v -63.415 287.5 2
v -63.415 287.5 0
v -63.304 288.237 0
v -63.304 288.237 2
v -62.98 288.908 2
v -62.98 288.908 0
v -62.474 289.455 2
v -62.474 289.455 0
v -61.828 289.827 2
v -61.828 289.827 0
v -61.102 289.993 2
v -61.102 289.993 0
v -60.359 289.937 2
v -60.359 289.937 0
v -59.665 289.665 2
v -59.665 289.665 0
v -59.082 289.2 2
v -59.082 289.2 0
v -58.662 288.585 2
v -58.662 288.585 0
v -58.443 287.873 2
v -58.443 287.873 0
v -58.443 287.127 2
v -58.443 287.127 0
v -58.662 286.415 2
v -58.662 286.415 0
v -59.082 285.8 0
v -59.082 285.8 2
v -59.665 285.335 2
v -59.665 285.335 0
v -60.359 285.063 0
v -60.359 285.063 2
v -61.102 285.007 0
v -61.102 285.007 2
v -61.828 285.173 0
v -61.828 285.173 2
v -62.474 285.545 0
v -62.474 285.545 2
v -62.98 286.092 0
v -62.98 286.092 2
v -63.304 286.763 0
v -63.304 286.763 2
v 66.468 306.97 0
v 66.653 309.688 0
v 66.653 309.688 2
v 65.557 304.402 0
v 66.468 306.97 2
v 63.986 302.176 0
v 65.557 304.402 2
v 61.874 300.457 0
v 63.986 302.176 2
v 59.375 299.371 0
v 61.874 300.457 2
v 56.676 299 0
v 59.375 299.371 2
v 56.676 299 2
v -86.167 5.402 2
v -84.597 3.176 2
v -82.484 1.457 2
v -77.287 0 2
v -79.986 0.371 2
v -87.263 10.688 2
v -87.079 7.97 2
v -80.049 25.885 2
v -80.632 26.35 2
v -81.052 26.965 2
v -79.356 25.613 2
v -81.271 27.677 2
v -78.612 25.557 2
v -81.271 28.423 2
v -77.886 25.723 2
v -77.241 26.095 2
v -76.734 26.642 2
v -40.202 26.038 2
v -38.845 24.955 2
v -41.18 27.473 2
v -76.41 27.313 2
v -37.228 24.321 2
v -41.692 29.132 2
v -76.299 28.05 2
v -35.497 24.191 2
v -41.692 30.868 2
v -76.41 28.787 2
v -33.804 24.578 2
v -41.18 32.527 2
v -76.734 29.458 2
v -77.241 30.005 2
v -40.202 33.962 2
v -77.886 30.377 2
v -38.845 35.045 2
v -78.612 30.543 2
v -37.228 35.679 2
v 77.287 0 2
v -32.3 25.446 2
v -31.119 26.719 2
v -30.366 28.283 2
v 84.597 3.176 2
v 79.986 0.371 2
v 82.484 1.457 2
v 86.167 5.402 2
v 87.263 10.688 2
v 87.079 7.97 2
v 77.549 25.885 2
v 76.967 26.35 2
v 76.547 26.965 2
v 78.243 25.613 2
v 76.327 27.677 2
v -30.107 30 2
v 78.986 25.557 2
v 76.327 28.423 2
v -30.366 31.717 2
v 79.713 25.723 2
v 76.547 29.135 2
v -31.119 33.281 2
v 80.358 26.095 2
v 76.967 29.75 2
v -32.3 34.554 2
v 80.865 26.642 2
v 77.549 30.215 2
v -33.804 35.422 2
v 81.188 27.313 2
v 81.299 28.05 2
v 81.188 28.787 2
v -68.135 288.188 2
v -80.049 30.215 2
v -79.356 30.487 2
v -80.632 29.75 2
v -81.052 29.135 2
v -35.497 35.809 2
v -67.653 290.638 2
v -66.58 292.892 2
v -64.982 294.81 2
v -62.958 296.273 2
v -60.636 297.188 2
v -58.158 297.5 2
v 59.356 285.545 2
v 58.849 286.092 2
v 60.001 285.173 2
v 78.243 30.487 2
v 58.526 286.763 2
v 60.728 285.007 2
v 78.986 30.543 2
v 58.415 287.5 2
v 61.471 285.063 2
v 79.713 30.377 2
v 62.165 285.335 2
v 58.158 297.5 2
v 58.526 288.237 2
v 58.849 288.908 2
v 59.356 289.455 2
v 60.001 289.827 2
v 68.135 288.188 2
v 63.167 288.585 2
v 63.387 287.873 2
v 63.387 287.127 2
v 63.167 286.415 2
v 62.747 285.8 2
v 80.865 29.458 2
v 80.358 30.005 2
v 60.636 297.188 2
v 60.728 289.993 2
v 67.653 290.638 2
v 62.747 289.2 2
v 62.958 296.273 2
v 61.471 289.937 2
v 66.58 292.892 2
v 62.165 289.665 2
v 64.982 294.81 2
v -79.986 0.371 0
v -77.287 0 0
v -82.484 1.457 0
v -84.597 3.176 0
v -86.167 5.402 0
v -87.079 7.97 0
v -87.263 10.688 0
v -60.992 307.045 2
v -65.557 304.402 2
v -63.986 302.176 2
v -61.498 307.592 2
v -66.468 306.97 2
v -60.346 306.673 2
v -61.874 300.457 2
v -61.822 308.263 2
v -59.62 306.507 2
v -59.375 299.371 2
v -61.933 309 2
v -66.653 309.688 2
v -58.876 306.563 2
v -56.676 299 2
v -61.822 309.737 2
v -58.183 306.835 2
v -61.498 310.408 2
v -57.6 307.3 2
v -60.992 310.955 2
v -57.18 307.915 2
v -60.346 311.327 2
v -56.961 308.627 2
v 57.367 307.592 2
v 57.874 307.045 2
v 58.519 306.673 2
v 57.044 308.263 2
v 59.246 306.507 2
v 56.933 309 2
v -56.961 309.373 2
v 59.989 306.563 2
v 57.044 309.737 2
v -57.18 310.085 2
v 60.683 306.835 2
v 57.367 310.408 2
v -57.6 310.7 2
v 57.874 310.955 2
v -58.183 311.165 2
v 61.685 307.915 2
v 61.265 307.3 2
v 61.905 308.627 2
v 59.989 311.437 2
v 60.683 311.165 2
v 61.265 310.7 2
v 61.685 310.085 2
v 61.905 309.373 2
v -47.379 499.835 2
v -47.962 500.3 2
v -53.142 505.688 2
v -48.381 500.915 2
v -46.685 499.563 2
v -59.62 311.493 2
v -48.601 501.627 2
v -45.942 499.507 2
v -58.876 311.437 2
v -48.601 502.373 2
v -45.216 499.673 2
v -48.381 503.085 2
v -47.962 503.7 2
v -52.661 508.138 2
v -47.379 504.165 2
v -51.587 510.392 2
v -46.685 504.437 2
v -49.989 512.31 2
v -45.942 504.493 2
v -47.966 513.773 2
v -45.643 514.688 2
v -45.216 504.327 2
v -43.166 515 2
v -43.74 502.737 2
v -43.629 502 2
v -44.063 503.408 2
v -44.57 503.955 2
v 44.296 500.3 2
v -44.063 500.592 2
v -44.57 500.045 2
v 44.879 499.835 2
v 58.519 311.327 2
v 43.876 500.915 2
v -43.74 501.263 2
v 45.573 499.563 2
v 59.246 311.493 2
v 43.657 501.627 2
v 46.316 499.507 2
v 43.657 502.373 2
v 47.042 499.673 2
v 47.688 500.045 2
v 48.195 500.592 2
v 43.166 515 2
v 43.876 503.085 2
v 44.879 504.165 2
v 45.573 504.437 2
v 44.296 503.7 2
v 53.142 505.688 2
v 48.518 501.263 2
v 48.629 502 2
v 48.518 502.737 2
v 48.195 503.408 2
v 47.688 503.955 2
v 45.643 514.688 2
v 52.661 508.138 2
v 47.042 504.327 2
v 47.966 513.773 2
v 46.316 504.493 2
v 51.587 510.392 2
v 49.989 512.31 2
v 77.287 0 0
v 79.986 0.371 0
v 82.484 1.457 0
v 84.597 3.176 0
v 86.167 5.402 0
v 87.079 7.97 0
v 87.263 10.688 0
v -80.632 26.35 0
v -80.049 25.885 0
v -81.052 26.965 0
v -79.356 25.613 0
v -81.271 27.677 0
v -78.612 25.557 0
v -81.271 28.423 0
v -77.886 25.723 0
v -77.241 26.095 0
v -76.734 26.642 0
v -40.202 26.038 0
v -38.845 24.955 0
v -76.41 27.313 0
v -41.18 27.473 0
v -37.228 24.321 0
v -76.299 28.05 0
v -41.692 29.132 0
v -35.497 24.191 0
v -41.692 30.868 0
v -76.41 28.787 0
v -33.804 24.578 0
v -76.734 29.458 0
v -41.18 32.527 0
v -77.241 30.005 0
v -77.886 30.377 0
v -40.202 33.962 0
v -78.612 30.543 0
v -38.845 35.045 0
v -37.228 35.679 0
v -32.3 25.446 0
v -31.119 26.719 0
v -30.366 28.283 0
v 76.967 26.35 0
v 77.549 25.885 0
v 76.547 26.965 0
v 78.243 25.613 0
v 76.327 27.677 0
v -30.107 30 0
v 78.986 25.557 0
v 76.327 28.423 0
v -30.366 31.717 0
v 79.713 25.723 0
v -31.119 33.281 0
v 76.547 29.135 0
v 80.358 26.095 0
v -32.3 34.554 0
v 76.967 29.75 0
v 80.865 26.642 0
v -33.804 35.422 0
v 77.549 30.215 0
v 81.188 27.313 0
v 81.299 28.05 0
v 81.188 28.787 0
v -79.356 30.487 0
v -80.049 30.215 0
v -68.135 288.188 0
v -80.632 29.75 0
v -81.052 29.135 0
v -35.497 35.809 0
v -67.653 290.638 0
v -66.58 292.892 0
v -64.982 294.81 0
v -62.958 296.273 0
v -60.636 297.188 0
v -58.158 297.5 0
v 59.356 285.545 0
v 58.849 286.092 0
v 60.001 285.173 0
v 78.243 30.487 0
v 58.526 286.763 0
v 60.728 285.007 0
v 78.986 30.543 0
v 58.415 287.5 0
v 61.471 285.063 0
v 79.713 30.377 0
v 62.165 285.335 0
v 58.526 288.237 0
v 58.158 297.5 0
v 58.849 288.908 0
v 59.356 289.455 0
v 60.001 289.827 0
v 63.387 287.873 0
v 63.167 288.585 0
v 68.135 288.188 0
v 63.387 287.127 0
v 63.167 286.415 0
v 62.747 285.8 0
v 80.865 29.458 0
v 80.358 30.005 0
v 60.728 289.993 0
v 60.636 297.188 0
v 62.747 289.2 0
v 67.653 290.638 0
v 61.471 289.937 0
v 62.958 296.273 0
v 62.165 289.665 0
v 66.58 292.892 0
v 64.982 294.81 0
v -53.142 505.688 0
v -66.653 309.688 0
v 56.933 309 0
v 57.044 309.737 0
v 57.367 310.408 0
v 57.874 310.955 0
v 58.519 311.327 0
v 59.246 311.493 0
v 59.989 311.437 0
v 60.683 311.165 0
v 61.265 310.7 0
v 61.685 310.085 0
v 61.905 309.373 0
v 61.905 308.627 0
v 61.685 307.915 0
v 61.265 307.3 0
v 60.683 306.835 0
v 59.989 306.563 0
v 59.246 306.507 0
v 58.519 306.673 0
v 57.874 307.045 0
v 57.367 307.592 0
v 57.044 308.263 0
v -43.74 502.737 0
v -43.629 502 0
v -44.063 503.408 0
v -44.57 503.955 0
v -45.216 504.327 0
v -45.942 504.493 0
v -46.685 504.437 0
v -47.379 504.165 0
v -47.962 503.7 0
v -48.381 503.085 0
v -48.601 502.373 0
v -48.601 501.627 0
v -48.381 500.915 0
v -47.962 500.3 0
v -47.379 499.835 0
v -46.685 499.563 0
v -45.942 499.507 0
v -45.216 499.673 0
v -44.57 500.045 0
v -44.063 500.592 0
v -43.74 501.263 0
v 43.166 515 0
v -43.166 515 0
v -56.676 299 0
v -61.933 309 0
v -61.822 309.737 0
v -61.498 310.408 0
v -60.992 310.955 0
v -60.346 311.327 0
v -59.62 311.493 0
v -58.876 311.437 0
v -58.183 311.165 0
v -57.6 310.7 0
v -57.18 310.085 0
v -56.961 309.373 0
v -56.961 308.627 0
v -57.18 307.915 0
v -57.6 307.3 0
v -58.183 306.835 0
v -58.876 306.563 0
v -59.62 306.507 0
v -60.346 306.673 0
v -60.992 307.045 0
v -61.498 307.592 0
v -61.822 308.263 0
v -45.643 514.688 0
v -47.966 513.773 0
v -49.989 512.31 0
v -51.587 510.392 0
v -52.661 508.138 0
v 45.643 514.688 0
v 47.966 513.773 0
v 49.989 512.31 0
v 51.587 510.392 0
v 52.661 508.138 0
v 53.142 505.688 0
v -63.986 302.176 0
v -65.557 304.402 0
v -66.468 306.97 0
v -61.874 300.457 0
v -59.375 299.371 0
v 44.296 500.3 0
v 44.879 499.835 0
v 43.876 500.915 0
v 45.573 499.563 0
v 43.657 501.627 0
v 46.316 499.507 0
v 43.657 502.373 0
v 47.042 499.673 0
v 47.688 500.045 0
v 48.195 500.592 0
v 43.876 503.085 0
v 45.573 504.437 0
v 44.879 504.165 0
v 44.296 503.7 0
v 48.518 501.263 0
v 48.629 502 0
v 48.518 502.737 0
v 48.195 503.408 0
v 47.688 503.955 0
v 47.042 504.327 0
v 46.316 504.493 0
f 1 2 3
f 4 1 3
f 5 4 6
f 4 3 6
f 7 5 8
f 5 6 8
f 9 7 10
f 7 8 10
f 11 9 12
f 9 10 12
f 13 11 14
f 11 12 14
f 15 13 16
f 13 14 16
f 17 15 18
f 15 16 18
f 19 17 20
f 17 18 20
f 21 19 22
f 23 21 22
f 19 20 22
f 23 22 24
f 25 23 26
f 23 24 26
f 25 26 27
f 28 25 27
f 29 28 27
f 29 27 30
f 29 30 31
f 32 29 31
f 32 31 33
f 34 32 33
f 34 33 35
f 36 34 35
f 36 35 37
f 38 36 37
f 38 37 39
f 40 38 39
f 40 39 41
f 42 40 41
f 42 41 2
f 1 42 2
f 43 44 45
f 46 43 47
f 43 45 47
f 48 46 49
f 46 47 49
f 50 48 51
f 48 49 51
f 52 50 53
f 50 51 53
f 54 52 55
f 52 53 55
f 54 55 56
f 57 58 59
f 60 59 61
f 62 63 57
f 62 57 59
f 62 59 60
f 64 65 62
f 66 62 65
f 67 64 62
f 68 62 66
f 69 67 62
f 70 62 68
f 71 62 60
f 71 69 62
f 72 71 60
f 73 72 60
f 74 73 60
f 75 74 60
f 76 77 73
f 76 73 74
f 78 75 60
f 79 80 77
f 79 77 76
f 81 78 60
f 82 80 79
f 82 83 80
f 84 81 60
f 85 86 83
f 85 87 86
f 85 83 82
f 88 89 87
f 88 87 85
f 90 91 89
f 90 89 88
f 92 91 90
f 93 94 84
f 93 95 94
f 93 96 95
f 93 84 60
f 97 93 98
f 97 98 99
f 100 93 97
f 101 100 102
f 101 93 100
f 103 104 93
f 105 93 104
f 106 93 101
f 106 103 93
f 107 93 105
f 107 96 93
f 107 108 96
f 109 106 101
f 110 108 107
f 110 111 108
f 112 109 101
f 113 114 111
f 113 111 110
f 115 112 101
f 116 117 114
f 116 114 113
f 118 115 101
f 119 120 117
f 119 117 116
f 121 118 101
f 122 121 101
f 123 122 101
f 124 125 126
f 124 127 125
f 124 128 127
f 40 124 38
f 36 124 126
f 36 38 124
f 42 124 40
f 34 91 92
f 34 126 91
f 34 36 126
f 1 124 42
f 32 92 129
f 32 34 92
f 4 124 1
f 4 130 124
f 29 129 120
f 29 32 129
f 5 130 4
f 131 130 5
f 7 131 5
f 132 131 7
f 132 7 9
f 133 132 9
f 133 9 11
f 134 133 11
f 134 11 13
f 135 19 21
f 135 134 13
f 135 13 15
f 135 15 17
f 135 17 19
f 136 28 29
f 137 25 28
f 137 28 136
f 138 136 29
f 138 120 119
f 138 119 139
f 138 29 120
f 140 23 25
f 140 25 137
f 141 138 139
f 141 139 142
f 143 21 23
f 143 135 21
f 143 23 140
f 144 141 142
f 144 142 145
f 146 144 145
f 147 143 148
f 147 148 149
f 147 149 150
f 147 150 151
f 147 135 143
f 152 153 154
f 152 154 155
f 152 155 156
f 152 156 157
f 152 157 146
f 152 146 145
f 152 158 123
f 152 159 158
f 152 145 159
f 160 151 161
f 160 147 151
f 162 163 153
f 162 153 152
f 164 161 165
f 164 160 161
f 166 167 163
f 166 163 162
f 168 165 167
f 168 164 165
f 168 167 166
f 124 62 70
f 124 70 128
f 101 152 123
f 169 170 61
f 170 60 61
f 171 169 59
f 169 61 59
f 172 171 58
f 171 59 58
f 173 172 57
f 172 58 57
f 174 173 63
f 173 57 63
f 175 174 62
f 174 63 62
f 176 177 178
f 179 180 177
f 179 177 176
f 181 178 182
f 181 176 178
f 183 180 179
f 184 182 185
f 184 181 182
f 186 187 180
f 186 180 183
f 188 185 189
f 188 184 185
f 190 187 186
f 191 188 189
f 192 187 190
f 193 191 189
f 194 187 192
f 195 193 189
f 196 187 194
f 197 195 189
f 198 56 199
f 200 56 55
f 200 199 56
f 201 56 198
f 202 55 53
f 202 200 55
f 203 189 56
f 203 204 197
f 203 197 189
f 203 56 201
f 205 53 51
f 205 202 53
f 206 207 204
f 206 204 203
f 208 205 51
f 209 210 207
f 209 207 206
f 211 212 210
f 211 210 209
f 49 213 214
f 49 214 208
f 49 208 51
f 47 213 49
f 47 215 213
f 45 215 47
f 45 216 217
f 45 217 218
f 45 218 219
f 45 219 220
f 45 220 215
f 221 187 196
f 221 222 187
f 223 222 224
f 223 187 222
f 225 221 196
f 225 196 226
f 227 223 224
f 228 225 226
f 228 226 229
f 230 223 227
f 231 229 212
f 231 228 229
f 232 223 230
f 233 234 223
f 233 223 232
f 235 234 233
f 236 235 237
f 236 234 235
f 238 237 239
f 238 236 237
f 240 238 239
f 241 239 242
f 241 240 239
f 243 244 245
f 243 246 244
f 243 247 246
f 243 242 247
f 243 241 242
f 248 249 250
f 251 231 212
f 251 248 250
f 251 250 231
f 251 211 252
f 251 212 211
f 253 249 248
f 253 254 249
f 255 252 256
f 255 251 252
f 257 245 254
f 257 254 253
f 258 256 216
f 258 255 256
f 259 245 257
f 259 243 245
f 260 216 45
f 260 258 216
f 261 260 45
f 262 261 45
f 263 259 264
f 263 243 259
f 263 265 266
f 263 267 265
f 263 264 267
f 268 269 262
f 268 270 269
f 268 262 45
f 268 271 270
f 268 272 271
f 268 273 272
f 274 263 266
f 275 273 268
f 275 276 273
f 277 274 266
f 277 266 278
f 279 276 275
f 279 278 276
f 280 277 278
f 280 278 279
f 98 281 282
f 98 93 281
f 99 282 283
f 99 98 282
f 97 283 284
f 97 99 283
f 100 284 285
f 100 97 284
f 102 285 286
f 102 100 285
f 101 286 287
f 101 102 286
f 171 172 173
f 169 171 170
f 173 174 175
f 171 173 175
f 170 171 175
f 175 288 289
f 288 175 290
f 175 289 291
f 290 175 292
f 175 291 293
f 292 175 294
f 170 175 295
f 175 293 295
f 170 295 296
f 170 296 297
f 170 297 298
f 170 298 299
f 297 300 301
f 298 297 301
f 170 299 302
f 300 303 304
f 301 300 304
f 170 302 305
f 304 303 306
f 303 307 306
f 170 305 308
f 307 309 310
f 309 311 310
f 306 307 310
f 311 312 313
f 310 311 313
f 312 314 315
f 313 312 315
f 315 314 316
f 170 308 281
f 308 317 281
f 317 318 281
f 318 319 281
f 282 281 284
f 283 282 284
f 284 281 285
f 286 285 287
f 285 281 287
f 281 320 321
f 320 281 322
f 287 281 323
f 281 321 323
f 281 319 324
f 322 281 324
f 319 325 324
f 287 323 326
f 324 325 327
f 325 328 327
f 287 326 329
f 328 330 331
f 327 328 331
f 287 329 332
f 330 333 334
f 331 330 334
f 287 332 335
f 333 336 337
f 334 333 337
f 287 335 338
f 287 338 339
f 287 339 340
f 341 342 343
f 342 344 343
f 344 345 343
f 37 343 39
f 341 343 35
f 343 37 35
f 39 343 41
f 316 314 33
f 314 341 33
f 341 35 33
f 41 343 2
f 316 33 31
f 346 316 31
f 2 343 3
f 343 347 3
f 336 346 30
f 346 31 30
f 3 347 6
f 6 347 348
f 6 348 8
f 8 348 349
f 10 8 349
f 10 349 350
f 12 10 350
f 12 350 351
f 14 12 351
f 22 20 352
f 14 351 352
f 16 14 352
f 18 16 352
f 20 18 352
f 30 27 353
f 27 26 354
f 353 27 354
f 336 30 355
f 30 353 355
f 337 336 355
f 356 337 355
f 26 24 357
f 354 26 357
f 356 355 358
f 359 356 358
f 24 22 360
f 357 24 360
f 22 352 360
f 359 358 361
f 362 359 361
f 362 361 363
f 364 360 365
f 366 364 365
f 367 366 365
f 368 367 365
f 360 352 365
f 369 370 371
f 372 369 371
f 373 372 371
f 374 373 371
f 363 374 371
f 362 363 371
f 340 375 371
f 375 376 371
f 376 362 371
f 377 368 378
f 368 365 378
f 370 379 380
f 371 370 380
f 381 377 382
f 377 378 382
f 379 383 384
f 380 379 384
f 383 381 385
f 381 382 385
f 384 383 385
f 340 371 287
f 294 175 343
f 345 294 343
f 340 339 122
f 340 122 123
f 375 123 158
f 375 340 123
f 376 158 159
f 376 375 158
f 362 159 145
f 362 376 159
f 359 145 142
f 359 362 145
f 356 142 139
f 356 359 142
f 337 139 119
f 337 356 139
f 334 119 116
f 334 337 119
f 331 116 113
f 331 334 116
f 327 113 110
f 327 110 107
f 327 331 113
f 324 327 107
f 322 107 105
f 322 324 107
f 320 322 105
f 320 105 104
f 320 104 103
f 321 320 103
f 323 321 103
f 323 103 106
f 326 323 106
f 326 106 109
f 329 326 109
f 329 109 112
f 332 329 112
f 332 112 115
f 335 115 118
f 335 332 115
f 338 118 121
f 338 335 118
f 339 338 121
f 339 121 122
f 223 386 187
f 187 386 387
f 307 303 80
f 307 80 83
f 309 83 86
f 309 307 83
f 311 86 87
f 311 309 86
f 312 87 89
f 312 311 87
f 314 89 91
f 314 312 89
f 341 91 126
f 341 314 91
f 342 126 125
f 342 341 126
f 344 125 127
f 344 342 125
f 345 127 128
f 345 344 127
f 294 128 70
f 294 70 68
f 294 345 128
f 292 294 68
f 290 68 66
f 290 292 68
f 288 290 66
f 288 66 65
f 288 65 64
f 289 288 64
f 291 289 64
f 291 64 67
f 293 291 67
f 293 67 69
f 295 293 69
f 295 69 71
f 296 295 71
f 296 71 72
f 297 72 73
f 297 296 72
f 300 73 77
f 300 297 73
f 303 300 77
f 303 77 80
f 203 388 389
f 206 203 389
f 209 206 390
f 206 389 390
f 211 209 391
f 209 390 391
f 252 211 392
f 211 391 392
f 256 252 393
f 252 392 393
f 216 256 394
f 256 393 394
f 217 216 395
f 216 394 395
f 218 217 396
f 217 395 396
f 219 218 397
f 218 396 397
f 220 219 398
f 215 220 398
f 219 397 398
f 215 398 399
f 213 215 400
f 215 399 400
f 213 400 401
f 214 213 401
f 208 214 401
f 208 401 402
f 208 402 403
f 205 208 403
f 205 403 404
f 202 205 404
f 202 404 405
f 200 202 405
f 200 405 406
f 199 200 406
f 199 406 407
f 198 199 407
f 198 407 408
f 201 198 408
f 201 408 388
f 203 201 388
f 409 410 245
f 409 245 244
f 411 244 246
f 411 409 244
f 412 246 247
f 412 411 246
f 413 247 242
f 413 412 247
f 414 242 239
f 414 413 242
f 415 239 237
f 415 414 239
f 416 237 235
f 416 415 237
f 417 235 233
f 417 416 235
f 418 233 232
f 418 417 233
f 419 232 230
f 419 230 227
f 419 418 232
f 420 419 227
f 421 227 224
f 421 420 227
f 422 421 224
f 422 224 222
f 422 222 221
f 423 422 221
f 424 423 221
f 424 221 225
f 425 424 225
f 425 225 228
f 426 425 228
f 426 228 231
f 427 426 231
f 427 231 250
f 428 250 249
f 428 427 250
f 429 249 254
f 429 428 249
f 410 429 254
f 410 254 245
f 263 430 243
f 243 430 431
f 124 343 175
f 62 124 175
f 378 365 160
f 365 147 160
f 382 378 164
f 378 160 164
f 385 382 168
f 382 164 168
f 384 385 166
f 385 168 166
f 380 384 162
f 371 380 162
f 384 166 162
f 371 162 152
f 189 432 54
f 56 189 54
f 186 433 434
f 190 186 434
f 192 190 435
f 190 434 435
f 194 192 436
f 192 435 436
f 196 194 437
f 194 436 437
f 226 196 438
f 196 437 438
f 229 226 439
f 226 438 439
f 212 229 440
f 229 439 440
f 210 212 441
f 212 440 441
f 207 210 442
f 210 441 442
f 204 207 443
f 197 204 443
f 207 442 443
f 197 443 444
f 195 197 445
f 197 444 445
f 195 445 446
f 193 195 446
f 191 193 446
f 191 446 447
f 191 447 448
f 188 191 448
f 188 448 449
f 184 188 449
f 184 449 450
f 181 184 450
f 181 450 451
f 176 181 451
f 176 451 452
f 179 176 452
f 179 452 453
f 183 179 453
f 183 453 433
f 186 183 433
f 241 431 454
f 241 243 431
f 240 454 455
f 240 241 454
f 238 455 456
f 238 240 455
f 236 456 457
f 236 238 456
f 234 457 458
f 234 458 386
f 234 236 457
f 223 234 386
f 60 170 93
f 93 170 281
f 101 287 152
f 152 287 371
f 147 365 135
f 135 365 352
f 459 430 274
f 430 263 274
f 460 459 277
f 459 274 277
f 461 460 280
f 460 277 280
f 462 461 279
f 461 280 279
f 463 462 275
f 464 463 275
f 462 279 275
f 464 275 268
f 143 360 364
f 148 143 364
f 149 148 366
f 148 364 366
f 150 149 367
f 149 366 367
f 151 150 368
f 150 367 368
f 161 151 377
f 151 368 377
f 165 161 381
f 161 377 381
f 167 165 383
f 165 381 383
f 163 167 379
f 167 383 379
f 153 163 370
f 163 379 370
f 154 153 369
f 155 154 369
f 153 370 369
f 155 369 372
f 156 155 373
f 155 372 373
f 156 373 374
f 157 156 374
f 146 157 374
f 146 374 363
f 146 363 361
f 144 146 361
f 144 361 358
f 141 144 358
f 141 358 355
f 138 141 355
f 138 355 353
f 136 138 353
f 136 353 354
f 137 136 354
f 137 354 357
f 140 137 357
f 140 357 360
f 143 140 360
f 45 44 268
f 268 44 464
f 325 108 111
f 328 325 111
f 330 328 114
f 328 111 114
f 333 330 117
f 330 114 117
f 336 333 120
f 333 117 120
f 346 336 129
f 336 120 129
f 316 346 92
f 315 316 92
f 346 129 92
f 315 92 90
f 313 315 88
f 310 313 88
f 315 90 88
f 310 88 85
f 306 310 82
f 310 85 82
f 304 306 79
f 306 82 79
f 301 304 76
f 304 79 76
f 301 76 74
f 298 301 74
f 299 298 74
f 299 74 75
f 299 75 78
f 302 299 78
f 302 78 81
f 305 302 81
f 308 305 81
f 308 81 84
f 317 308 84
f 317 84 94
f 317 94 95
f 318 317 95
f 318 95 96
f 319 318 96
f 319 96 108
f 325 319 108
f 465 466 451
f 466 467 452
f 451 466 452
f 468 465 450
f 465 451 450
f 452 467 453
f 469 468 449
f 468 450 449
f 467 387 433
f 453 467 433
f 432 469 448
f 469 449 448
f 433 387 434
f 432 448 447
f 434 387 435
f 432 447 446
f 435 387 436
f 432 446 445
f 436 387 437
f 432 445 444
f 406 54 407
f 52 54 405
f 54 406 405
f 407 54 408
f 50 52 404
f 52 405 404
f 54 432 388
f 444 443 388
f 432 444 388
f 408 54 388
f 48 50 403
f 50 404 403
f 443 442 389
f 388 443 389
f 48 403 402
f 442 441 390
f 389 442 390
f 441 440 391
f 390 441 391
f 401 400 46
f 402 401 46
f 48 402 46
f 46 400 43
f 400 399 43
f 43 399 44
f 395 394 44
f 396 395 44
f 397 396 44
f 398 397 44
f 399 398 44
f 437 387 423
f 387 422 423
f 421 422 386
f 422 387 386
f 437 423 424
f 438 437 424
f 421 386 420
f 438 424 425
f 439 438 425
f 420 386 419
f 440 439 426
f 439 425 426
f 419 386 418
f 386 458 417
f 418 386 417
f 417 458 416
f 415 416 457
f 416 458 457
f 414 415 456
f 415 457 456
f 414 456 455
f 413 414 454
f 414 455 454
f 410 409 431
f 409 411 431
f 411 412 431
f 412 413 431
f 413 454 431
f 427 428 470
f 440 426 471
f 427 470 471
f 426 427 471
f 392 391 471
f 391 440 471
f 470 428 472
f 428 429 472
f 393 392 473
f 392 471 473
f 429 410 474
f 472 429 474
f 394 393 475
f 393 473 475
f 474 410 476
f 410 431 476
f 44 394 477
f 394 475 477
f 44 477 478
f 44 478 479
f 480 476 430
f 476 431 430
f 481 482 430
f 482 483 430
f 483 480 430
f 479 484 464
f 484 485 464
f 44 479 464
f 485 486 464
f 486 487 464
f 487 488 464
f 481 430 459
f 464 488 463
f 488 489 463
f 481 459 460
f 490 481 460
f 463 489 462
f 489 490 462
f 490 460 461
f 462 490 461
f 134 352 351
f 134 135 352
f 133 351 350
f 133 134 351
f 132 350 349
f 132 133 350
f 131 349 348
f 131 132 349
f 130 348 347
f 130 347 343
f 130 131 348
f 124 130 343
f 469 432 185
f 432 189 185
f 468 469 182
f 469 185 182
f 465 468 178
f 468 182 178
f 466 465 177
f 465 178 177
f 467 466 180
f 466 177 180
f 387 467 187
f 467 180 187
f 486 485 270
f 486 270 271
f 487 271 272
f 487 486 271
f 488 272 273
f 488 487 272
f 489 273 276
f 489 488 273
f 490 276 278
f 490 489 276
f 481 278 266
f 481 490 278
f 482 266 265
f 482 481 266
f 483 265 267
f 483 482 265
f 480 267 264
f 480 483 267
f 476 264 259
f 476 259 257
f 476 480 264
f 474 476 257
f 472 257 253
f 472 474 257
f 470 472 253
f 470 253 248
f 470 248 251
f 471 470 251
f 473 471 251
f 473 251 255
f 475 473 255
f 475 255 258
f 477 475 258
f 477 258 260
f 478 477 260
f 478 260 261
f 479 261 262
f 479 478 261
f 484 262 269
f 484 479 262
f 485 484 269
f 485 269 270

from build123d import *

# Parameters (mm, degrees)
SKETCH1_R           = 2.5
BOSS_EXTRUDE1_DEPTH = 2
FILLET1_R           = 10
SKETCH6_R           = 2.5
CUT_EXTRUDE5_DEPTH  = 10
FILLET3_R           = 10
FILLET4_R           = 10
SKETCH11_3_R        = 5.825
CUT_EXTRUDE11_DEPTH = 10


with BuildPart() as part:
    # Sketch1 → Boss-Extrude1 (new body)
    with BuildSketch(Plane.XY):
        Polygon((-88, 0), (88, 0), (52.5, 515), (-52.5, 515), align=None)
        with Locations((-78.799252079, 28.05)):
            Circle(SKETCH1_R, mode=Mode.SUBTRACT)
        with Locations((-46.128912273, 502)):
            Circle(SKETCH1_R, mode=Mode.SUBTRACT)
        with Locations((46.128912273, 502)):
            Circle(SKETCH1_R, mode=Mode.SUBTRACT)
        with Locations((78.799252079, 28.05)):
            Circle(SKETCH1_R, mode=Mode.SUBTRACT)
    extrude(amount=BOSS_EXTRUDE1_DEPTH)

    # Fillet1
    fillet1_edges = [part.edges().sort_by_distance(p)[0] for p in [
        (-88, 0, 1),
        (88, 0, 1),
        (52.5, 515, 1),
        (-52.5, 515, 1),
    ]]
    fillet(fillet1_edges, radius=FILLET1_R)

    # Sketch6 → Cut-Extrude5 (cut)
    with BuildSketch(Plane(origin=(0, 0, 0), x_dir=(-1, 0, 0), z_dir=(0, 0, -1))):
        Polygon((67.389320388, 299), (-67.389320388, 299), (-67.492718447, 297.5), (67.492718447, 297.5), align=None)
        with Locations((-60.914834604, 287.5)):
            Circle(SKETCH6_R)
        with Locations((-59.432795769, 309)):
            Circle(SKETCH6_R)
        with Locations((59.432795769, 309)):
            Circle(SKETCH6_R)
        with Locations((60.914834604, 287.5)):
            Circle(SKETCH6_R)
    extrude(amount=-CUT_EXTRUDE5_DEPTH, mode=Mode.SUBTRACT)


with BuildPart() as cut_extrude5_piece_1:
    # of the separate pieces the step leaves, piece 1, a body of its own (cut_extrude5_pieces)
    add(part.part.solids().sort_by_distance((-77.286949637, 0, 0))[0])

    # Fillet3
    fillet3_edges = [cut_extrude5_piece_1.edges().sort_by_distance(p)[0] for p in [
        (-67.492718447, 297.5, 1),
        (67.492718447, 297.5, 1),
    ]]
    fillet(fillet3_edges, radius=FILLET3_R)

    # Sketch11<3> → Cut-Extrude11 (cut)
    with BuildSketch(Plane.XY.offset(2)):
        with Locations((-35.932038835, 30)):
            Circle(SKETCH11_3_R)
    extrude(amount=-CUT_EXTRUDE11_DEPTH, mode=Mode.SUBTRACT)


with BuildPart() as cut_extrude5_piece_2:
    # of the separate pieces the step leaves, piece 2, a body of its own (cut_extrude5_pieces)
    add(part.part.solids().sort_by_distance((-53.141916618, 505.687688505, 0))[0])

    # Fillet4
    fillet4_edges = [cut_extrude5_piece_2.edges().sort_by_distance(p)[0] for p in [
        (-67.389320388, 299, 1),
        (67.389320388, 299, 1),
    ]]
    fillet(fillet4_edges, radius=FILLET4_R)


solid = Compound([cut_extrude5_piece_1.part, cut_extrude5_piece_2.part])
